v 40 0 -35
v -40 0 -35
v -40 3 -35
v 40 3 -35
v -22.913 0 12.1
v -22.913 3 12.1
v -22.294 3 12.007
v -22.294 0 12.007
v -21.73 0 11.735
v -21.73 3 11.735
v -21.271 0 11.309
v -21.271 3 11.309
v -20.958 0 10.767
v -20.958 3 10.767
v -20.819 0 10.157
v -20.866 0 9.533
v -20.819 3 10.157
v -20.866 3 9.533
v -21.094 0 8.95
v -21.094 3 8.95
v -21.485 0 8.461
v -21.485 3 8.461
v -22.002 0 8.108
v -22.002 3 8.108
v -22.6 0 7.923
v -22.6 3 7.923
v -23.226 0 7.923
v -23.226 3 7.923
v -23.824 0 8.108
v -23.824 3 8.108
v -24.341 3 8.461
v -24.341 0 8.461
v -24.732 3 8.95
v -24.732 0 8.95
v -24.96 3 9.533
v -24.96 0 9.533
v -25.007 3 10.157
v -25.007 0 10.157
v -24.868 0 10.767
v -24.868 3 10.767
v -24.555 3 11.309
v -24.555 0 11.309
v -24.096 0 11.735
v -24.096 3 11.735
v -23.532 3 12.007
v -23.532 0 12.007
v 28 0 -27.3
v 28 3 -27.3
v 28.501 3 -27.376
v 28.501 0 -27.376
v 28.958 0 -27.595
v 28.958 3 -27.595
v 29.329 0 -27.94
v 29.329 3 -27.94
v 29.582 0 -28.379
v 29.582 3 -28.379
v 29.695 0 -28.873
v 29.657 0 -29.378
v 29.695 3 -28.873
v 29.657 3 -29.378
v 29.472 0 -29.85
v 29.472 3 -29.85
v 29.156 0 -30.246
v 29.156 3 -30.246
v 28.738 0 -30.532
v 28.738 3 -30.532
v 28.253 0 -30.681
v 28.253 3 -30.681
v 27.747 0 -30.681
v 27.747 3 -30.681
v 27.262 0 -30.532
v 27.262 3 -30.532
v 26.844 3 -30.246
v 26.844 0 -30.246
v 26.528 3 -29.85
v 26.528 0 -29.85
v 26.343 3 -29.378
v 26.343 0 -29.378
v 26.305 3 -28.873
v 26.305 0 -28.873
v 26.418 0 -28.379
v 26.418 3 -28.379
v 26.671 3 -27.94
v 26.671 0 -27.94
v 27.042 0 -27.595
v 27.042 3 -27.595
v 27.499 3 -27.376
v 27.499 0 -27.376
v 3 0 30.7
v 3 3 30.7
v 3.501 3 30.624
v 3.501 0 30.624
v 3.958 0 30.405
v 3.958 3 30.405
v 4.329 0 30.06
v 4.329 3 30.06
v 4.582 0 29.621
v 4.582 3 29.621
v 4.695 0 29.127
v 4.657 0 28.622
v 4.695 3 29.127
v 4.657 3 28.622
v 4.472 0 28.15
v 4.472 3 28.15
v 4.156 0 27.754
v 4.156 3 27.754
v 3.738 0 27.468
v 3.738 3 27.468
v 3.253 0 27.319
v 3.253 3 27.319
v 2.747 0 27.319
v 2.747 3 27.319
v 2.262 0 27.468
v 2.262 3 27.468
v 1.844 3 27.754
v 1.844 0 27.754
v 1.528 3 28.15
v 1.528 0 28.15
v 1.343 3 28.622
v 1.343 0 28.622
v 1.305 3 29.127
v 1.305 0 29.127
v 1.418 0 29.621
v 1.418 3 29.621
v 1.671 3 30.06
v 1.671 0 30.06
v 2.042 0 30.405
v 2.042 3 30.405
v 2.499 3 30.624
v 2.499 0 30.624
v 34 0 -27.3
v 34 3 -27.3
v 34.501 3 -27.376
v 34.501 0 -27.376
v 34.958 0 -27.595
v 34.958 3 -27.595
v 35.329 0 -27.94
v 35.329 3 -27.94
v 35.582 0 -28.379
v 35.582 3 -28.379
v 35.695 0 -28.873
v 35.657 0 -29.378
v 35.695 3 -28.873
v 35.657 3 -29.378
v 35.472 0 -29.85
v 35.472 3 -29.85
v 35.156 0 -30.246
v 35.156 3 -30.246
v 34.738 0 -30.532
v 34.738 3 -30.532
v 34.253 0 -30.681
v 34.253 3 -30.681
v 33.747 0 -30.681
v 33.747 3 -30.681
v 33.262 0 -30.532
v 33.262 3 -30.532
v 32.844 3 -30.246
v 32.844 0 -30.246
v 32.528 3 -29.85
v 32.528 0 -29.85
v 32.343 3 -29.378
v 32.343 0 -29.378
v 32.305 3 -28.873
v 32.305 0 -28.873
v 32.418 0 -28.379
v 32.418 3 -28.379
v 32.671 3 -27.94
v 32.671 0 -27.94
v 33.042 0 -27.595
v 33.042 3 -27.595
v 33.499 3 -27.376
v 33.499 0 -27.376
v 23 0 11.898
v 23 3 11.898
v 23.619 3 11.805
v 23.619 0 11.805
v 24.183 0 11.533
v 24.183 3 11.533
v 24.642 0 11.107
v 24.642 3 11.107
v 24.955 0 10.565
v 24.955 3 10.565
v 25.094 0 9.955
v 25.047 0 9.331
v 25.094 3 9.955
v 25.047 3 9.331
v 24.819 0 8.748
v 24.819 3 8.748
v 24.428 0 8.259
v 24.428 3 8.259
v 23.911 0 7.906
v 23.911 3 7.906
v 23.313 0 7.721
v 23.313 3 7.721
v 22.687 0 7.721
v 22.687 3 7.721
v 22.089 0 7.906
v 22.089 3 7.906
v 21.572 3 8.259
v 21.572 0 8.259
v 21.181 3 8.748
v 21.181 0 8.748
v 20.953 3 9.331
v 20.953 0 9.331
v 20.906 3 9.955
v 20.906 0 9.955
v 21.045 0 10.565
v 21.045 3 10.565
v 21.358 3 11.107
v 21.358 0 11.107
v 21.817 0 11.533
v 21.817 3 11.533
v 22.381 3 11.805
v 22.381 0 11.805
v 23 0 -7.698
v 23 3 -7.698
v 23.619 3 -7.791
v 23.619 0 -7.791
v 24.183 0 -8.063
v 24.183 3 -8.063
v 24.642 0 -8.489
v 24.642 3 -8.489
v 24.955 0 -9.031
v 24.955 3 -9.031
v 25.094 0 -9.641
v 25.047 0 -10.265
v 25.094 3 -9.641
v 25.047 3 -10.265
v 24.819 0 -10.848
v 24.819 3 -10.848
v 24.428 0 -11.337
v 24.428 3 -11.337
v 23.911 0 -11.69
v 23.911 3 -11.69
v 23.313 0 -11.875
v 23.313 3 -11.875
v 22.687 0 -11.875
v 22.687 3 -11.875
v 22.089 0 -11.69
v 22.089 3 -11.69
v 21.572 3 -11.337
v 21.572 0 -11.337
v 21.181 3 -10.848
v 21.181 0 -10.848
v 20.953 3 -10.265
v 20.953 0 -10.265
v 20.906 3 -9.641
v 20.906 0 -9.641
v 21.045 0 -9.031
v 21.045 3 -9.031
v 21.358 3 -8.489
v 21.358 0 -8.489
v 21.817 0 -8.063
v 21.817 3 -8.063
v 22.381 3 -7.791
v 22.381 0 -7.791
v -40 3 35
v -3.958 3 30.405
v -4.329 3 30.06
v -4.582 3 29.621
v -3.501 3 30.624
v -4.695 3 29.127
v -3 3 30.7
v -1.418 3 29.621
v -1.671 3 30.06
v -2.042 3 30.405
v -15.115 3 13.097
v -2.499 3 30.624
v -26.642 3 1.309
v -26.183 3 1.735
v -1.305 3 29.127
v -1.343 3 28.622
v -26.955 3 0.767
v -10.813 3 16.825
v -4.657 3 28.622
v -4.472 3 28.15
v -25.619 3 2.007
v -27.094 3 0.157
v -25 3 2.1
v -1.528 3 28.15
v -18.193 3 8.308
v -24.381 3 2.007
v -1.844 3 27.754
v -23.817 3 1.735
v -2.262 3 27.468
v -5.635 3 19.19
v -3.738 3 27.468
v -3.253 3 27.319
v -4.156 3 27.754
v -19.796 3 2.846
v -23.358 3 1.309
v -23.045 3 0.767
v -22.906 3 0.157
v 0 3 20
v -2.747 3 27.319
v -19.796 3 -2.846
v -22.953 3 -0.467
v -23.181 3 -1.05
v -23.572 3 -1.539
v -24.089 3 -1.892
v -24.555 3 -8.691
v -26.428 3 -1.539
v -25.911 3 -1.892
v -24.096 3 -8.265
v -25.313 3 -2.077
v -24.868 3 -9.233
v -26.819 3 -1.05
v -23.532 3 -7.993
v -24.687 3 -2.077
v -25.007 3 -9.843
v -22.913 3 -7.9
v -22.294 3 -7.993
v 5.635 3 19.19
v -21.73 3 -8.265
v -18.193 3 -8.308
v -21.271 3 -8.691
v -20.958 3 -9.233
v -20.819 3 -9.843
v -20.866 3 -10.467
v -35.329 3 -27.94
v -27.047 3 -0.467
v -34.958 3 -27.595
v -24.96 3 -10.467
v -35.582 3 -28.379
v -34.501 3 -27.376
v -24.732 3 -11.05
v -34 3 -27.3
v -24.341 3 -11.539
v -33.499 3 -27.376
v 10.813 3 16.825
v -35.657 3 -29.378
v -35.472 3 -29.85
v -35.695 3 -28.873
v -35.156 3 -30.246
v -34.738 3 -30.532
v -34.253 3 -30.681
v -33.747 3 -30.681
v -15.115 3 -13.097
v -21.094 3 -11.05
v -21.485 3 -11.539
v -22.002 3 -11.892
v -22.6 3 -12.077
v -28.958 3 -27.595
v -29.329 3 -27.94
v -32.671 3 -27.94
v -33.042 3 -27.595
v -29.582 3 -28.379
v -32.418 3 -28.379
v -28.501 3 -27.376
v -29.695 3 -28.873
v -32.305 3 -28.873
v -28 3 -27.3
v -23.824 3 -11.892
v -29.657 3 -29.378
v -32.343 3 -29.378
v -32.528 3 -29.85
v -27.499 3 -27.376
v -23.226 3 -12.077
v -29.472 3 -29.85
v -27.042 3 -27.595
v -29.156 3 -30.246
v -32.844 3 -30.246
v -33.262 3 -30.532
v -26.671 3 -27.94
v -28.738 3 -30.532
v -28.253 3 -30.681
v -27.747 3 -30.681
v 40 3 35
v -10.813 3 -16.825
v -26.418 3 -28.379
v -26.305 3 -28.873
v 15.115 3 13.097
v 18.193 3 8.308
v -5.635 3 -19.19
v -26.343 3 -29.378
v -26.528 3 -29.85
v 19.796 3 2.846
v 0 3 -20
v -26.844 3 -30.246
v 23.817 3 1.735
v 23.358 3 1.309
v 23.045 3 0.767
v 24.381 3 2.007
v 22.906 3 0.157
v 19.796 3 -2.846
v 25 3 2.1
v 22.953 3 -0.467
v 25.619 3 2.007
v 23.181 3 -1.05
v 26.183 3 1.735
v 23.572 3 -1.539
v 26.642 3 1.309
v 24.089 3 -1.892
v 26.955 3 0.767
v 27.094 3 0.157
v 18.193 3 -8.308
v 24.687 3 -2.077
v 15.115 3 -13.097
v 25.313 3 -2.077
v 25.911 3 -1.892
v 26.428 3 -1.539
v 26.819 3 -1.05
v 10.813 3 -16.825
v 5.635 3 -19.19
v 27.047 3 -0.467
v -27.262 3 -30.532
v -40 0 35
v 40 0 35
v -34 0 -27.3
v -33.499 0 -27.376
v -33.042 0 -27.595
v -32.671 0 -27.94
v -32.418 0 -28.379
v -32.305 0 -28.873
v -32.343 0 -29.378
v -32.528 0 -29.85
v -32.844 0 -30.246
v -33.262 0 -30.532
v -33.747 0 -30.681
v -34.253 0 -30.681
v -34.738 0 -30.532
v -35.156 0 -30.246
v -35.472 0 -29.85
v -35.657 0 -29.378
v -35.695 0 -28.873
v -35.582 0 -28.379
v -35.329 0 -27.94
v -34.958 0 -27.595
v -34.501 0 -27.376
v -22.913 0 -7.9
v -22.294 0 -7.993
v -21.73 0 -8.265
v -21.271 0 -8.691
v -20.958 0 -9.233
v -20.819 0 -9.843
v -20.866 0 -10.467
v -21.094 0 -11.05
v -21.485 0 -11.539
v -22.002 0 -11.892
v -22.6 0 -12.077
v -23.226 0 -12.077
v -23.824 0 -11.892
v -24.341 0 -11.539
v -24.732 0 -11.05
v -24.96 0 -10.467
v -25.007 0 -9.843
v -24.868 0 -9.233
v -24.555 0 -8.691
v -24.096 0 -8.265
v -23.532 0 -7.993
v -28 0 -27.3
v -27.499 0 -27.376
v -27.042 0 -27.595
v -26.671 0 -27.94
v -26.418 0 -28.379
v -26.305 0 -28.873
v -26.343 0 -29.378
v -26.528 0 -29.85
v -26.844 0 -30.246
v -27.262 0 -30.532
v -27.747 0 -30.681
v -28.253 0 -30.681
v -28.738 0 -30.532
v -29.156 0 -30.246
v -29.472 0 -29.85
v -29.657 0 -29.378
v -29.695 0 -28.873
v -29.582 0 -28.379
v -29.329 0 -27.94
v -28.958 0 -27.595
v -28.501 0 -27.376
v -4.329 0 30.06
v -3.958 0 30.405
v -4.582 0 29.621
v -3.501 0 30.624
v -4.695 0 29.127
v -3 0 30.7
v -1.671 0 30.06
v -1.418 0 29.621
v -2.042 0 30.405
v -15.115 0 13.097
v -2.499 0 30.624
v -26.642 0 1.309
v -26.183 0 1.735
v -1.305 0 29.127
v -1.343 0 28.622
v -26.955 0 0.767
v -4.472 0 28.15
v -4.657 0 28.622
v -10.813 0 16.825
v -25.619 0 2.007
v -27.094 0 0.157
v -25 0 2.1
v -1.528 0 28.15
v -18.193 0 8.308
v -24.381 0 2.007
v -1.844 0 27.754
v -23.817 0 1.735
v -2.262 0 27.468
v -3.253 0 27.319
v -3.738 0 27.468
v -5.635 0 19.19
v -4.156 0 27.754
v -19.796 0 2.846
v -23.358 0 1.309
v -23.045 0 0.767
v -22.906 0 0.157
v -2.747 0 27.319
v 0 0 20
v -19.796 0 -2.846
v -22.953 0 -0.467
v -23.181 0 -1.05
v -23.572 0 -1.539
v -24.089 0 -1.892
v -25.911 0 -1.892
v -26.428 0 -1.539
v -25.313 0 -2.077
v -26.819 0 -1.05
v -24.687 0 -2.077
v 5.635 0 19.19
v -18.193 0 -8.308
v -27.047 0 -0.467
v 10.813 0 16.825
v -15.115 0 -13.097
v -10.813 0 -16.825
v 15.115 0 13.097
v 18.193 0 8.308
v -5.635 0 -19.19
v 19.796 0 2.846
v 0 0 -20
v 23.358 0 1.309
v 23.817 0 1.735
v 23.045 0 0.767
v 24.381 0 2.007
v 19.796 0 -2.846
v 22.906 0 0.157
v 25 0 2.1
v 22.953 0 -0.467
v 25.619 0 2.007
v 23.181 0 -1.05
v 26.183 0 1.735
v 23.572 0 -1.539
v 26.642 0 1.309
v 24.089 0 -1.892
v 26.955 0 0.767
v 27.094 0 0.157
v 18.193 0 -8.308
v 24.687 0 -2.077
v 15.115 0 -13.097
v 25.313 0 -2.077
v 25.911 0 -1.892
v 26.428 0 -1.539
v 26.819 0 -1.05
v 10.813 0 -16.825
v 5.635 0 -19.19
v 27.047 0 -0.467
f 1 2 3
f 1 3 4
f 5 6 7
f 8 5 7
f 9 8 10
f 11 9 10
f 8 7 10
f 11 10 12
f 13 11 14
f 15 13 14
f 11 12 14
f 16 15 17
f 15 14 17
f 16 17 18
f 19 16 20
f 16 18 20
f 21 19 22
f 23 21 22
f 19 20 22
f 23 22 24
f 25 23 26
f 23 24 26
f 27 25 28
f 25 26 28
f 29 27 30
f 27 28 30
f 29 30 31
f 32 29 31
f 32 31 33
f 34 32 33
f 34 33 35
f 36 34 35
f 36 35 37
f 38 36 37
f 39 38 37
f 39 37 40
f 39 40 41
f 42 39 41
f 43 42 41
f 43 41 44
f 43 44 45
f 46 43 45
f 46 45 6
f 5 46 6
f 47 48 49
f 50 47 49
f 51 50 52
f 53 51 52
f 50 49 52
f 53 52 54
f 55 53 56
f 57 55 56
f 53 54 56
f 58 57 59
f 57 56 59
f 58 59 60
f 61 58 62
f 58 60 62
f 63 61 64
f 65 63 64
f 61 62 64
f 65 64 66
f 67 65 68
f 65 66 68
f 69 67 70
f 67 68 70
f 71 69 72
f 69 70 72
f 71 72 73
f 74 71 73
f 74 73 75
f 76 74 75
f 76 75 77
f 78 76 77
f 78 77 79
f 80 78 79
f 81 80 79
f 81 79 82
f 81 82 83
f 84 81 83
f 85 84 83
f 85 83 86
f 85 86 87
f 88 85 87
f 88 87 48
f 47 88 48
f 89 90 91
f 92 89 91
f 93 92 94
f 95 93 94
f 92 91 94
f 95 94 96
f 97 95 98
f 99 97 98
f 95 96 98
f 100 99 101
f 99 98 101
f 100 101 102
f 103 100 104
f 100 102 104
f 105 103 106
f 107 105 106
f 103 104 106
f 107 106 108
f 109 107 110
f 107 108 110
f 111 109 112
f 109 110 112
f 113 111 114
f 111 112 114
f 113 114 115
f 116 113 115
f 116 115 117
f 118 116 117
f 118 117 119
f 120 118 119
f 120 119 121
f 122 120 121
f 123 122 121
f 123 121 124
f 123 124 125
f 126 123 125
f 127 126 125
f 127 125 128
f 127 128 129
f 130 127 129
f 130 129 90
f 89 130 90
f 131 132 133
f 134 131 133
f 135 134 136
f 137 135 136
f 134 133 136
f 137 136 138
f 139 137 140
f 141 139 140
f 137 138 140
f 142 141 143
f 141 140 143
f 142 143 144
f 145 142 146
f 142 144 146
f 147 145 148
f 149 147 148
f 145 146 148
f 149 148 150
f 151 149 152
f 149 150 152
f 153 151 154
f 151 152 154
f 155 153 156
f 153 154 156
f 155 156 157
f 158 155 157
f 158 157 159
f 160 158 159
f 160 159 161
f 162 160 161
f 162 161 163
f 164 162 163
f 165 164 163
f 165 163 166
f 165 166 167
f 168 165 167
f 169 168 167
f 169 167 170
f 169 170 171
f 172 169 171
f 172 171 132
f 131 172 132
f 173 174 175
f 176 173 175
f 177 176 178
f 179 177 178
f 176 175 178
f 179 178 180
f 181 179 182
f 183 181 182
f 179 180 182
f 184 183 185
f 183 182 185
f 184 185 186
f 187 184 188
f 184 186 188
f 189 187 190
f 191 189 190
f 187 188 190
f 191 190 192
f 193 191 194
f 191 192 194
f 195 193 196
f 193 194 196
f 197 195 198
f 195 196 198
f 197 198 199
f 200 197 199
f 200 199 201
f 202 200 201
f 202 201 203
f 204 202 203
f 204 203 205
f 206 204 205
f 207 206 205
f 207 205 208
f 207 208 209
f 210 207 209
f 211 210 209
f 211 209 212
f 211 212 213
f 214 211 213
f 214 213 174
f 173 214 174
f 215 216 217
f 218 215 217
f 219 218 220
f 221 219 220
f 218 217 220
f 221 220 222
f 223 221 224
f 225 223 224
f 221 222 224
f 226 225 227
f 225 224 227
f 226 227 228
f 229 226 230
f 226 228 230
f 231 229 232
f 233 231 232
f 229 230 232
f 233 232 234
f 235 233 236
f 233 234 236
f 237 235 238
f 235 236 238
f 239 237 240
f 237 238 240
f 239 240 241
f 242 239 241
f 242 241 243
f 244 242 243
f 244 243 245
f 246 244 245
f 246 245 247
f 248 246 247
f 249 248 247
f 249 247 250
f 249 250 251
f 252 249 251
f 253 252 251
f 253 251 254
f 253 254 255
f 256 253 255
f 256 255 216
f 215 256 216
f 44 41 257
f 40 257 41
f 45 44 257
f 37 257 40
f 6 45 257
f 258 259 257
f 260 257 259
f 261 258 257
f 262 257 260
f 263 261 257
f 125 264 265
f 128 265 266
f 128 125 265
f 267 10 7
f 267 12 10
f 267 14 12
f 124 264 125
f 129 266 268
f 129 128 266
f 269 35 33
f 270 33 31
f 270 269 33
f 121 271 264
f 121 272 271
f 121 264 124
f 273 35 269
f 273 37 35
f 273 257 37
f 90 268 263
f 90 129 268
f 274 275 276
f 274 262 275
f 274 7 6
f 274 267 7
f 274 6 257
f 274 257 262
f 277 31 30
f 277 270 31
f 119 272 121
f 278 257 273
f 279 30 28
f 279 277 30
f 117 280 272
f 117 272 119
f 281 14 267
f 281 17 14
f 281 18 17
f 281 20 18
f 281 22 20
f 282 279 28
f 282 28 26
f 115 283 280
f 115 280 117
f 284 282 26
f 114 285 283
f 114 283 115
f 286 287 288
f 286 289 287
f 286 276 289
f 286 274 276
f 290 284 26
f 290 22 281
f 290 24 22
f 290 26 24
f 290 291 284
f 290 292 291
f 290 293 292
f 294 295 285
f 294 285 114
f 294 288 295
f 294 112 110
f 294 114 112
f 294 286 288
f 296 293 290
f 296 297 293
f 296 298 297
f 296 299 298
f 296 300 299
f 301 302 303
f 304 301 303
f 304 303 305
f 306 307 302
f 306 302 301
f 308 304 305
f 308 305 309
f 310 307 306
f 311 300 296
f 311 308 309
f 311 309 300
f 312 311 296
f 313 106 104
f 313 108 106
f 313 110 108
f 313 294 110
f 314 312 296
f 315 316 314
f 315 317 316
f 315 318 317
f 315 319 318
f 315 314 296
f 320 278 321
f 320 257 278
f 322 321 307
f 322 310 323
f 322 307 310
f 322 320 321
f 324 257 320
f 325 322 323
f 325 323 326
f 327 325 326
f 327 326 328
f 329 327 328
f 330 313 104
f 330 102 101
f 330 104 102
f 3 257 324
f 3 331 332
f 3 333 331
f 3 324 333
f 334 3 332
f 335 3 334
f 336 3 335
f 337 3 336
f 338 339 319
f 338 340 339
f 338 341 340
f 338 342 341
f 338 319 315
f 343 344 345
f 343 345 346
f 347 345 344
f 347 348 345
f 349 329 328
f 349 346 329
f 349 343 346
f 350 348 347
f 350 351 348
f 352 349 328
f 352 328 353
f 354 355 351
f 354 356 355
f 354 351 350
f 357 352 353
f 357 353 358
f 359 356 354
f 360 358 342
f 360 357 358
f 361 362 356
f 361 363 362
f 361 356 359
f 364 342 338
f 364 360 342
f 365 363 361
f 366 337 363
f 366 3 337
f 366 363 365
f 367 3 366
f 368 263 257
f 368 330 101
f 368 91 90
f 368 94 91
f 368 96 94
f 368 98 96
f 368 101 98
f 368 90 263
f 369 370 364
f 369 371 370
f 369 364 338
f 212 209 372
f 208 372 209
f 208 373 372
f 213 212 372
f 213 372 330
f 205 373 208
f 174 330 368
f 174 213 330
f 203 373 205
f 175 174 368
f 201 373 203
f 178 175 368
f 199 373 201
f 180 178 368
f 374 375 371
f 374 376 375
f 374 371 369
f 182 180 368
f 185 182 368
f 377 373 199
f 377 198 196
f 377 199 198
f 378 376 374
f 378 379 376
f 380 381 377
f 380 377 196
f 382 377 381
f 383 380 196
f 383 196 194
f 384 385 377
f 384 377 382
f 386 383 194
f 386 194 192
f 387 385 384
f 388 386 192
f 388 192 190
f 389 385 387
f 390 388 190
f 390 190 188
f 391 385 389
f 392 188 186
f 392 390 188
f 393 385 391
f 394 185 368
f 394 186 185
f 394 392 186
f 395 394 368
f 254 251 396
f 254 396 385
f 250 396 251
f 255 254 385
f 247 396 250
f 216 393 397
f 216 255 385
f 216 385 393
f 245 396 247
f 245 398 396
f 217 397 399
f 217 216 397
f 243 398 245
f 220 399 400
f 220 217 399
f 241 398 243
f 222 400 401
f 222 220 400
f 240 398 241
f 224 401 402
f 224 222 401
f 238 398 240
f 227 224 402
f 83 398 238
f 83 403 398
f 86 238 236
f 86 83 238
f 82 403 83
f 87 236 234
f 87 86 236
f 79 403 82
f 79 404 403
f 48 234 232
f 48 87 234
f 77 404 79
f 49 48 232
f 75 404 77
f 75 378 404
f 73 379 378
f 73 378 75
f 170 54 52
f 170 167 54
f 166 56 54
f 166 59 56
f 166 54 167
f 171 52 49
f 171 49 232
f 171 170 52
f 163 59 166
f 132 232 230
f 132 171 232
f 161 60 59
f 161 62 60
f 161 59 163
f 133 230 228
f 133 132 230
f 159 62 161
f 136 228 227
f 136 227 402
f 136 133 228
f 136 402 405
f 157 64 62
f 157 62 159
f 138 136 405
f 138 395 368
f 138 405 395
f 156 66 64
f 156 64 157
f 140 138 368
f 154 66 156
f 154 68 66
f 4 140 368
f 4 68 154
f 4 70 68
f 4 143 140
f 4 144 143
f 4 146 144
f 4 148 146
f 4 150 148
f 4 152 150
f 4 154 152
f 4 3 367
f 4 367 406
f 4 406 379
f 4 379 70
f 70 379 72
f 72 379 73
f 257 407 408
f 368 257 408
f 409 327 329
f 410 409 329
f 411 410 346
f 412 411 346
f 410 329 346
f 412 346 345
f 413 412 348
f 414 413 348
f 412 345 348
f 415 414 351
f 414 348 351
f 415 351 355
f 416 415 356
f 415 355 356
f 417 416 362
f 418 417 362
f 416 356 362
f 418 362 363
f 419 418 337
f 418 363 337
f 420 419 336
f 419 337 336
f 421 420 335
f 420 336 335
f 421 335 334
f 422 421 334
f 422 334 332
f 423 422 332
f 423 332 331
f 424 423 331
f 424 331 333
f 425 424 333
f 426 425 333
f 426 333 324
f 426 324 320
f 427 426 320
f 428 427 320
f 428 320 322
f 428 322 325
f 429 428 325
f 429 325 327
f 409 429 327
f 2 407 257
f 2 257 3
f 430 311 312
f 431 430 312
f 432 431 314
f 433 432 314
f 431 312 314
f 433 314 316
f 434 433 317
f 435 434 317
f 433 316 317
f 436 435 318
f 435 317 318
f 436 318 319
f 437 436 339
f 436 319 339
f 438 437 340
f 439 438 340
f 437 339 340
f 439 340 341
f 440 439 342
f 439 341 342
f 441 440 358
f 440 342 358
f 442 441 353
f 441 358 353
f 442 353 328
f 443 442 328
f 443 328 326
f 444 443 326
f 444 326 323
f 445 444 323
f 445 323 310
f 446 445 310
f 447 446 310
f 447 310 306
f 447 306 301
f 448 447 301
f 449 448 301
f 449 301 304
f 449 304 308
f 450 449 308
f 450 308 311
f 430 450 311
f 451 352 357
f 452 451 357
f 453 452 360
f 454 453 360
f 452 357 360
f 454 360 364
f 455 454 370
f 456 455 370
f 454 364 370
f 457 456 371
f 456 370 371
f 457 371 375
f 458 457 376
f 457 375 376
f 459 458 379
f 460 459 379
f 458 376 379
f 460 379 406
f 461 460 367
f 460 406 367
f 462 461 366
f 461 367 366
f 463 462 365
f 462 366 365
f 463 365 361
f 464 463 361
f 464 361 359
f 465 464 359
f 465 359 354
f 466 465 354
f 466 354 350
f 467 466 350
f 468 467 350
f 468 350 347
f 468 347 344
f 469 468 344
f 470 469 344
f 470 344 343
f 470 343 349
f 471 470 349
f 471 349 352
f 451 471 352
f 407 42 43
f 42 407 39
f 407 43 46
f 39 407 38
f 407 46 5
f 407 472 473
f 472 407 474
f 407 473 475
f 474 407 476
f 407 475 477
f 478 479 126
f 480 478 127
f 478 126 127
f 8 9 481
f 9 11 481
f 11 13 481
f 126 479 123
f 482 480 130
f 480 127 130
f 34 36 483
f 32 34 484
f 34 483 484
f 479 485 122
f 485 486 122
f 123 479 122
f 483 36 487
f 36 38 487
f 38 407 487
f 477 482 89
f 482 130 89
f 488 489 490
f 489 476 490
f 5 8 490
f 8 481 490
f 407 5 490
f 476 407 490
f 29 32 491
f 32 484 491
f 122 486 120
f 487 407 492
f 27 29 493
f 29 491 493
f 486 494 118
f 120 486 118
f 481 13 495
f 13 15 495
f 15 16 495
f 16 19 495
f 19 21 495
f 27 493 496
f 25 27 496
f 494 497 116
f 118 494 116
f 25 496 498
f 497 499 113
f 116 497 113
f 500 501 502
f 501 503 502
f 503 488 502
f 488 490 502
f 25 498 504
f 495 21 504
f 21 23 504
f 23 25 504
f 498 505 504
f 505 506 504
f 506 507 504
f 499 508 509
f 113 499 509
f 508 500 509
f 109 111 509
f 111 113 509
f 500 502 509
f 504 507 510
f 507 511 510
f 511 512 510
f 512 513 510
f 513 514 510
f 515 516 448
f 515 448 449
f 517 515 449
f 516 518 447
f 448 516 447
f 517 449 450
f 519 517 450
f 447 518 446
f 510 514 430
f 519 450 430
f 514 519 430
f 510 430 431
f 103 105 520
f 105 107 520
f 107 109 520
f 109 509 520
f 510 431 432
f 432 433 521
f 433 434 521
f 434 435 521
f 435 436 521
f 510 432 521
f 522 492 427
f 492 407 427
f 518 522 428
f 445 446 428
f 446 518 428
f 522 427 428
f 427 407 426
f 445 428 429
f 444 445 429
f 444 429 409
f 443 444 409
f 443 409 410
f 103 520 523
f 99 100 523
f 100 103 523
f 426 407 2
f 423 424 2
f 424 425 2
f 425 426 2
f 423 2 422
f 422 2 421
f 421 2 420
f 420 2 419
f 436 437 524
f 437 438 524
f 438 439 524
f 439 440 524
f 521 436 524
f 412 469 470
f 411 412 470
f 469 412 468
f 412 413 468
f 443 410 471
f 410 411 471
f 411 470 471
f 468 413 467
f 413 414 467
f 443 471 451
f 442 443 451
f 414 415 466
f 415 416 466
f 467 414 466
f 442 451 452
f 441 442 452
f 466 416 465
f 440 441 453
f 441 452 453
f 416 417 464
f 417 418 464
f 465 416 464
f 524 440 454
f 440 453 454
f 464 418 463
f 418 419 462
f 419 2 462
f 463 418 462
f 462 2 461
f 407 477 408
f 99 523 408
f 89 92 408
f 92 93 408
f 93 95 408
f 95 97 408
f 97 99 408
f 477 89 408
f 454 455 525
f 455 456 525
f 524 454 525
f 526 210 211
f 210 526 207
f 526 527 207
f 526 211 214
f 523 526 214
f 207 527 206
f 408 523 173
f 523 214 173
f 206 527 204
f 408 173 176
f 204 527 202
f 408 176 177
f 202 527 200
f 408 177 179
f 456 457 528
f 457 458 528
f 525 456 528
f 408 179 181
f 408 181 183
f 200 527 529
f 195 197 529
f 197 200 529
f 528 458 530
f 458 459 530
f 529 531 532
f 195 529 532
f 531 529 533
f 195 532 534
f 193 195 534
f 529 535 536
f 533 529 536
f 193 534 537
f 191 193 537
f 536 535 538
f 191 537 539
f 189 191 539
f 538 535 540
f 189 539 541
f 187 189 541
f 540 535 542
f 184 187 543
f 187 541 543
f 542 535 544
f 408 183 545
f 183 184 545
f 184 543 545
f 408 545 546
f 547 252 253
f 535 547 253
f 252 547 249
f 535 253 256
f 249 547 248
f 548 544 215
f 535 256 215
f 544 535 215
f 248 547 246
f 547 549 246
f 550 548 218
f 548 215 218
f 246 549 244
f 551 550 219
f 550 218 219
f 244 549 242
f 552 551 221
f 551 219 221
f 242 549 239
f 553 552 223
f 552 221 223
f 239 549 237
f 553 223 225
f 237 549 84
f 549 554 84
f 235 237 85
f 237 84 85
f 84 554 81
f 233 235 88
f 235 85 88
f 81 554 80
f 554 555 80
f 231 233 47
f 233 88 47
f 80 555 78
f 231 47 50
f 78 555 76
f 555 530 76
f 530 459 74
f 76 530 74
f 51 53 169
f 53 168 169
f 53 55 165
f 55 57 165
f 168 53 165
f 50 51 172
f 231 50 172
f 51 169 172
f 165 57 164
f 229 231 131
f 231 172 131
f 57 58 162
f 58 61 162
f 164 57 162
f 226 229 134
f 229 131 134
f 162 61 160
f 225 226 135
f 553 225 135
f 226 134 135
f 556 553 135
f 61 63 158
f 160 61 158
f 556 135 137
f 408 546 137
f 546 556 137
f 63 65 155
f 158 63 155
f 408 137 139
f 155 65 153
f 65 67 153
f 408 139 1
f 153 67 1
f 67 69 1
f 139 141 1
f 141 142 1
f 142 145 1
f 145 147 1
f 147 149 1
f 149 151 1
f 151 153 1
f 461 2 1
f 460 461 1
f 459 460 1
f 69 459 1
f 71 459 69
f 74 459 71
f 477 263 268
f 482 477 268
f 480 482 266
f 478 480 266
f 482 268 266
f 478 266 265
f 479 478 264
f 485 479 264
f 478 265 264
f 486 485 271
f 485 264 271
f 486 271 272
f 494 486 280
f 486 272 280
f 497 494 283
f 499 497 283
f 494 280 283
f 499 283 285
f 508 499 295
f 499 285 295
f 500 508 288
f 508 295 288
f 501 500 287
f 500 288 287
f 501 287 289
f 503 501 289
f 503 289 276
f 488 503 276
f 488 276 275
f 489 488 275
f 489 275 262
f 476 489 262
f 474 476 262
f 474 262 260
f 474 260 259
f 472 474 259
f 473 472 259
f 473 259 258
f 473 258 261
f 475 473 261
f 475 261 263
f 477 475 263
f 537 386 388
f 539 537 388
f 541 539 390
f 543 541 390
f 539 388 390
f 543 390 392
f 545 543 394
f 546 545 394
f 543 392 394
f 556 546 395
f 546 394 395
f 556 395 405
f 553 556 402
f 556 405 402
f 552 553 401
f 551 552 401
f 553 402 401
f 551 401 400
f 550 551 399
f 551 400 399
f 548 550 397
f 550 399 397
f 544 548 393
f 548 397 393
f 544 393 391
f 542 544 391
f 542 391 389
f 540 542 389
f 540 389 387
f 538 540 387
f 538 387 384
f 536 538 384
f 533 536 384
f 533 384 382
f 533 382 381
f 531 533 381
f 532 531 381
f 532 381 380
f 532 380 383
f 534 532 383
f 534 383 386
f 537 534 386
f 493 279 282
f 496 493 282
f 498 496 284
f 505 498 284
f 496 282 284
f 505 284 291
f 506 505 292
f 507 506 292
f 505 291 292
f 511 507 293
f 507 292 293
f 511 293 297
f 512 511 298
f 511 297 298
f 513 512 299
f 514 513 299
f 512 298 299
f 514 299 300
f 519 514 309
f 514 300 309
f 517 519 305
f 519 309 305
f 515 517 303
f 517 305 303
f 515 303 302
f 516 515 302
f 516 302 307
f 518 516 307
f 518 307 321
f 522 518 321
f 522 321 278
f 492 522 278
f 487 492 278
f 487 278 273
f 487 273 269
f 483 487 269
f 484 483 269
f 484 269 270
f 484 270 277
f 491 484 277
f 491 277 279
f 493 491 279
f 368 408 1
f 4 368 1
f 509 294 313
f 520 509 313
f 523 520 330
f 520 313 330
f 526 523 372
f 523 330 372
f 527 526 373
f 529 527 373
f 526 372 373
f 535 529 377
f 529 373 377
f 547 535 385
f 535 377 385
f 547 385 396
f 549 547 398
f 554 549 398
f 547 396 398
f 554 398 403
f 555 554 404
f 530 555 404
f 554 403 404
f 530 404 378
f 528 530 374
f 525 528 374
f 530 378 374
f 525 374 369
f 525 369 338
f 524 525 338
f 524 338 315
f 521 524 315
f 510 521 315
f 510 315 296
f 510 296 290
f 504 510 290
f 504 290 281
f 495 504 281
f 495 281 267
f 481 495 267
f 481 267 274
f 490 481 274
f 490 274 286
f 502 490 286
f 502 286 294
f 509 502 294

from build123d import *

# Parameters (mm, degrees)
BASE_W                        = 80
BASE_H                        = 70
BASE_PLATE_DEPTH              = 3
EXTRUDER_HOLE_CUT_REACH       = 55.235
EXTRUDER_HOLE_R               = 20
EXTRUDER_SREW_HOLES_CUT_REACH = 55.235
EXTRUDER_MOUNT_HOLES_R        = 2.1
LM8_TWO_REACH                 = 55.235
LM8UU_HOLES_R                 = 1.7
LM8_CENTER_REACH              = 55.235
LM8UU_CENTER_R                = 1.7


with BuildPart() as part:
    # Base → Base Plate (new body)
    with BuildSketch(Plane(origin=(0, 0, 0), x_dir=(1, 0, 0), z_dir=(0, 1, 0))):
        Rectangle(BASE_W, BASE_H)
    extrude(amount=BASE_PLATE_DEPTH)

    # Extruder hole → Extruder Hole Cut (cut, up to next)
    with BuildSketch(Plane(origin=(0, 3, 0), x_dir=(1, 0, 0), z_dir=(0, 1, 0)), mode=Mode.PRIVATE) as extruder_hole_cut_sk1:
        with Locations(Location((0, 0, 0), (0, 0, 270))):
            Circle(EXTRUDER_HOLE_R)
    extruder_hole_cut_tool1 = extrude(extruder_hole_cut_sk1.sketch, amount=-EXTRUDER_HOLE_CUT_REACH, mode=Mode.PRIVATE) & part.part
    add(extruder_hole_cut_tool1.solids().sort_by_distance((0, 3, 0))[0], mode=Mode.SUBTRACT)

    # Extruder Mount Holes → Extruder Srew Holes Cut (cut, up to next)
    with BuildSketch(Plane(origin=(0, 3, 0), x_dir=(1, 0, 0), z_dir=(0, 1, 0)), mode=Mode.PRIVATE) as extruder_srew_holes_cut_sk1:
        with Locations(Location((-25, 0, 0), (0, 0, 270))):
            Circle(EXTRUDER_MOUNT_HOLES_R)
    extruder_srew_holes_cut_tool1 = extrude(extruder_srew_holes_cut_sk1.sketch, amount=-EXTRUDER_SREW_HOLES_CUT_REACH, mode=Mode.PRIVATE) & part.part
    # Extruder Mount Holes → Extruder Srew Holes Cut (cut, up to next)
    with BuildSketch(Plane(origin=(0, 3, 0), x_dir=(1, 0, 0), z_dir=(0, 1, 0)), mode=Mode.PRIVATE) as extruder_srew_holes_cut_sk2:
        with Locations(Location((-22.912878475, 10, 0), (0, 0, 270))):
            Circle(EXTRUDER_MOUNT_HOLES_R)
    extruder_srew_holes_cut_tool2 = extrude(extruder_srew_holes_cut_sk2.sketch, amount=-EXTRUDER_SREW_HOLES_CUT_REACH, mode=Mode.PRIVATE) & part.part
    # Extruder Mount Holes → Extruder Srew Holes Cut (cut, up to next)
    with BuildSketch(Plane(origin=(0, 3, 0), x_dir=(1, 0, 0), z_dir=(0, 1, 0)), mode=Mode.PRIVATE) as extruder_srew_holes_cut_sk3:
        with Locations(Location((-22.912878475, -10, 0), (0, 0, 270))):
            Circle(EXTRUDER_MOUNT_HOLES_R)
    extruder_srew_holes_cut_tool3 = extrude(extruder_srew_holes_cut_sk3.sketch, amount=-EXTRUDER_SREW_HOLES_CUT_REACH, mode=Mode.PRIVATE) & part.part
    # Extruder Mount Holes → Extruder Srew Holes Cut (cut, up to next)
    with BuildSketch(Plane(origin=(0, 3, 0), x_dir=(1, 0, 0), z_dir=(0, 1, 0)), mode=Mode.PRIVATE) as extruder_srew_holes_cut_sk4:
        with Locations(Location((25, 0, 0), (0, 0, 270))):
            Circle(EXTRUDER_MOUNT_HOLES_R)
    extruder_srew_holes_cut_tool4 = extrude(extruder_srew_holes_cut_sk4.sketch, amount=-EXTRUDER_SREW_HOLES_CUT_REACH, mode=Mode.PRIVATE) & part.part
    # Extruder Mount Holes → Extruder Srew Holes Cut (cut, up to next)
    with BuildSketch(Plane(origin=(0, 3, 0), x_dir=(1, 0, 0), z_dir=(0, 1, 0)), mode=Mode.PRIVATE) as extruder_srew_holes_cut_sk5:
        with Locations(Location((23, 9.797958971, 0), (0, 0, 270))):
            Circle(EXTRUDER_MOUNT_HOLES_R)
    extruder_srew_holes_cut_tool5 = extrude(extruder_srew_holes_cut_sk5.sketch, amount=-EXTRUDER_SREW_HOLES_CUT_REACH, mode=Mode.PRIVATE) & part.part
    # Extruder Mount Holes → Extruder Srew Holes Cut (cut, up to next)
    with BuildSketch(Plane(origin=(0, 3, 0), x_dir=(1, 0, 0), z_dir=(0, 1, 0)), mode=Mode.PRIVATE) as extruder_srew_holes_cut_sk6:
        with Locations(Location((23, -9.797958971, 0), (0, 0, 270))):
            Circle(EXTRUDER_MOUNT_HOLES_R)
    extruder_srew_holes_cut_tool6 = extrude(extruder_srew_holes_cut_sk6.sketch, amount=-EXTRUDER_SREW_HOLES_CUT_REACH, mode=Mode.PRIVATE) & part.part
    add(extruder_srew_holes_cut_tool1.solids().sort_by_distance((-25, 3, 0))[0], mode=Mode.SUBTRACT)
    add(extruder_srew_holes_cut_tool2.solids().sort_by_distance((-22.912878, 3, -10))[0], mode=Mode.SUBTRACT)
    add(extruder_srew_holes_cut_tool3.solids().sort_by_distance((-22.912878, 3, 10))[0], mode=Mode.SUBTRACT)
    add(extruder_srew_holes_cut_tool4.solids().sort_by_distance((25, 3, 0))[0], mode=Mode.SUBTRACT)
    add(extruder_srew_holes_cut_tool5.solids().sort_by_distance((23, 3, -9.797959))[0], mode=Mode.SUBTRACT)
    add(extruder_srew_holes_cut_tool6.solids().sort_by_distance((23, 3, 9.797959))[0], mode=Mode.SUBTRACT)

    # LM8uu Holes → LM8 Two (cut, up to next)
    with BuildSketch(Plane(origin=(0, 3, 0), x_dir=(1, 0, 0), z_dir=(0, 1, 0)), mode=Mode.PRIVATE) as lm8_two_sk1:
        with Locations(Location((-34, 29, 0), (0, 0, 270))):
            Circle(LM8UU_HOLES_R)
    lm8_two_tool1 = extrude(lm8_two_sk1.sketch, amount=-LM8_TWO_REACH, mode=Mode.PRIVATE) & part.part
    # LM8uu Holes → LM8 Two (cut, up to next)
    with BuildSketch(Plane(origin=(0, 3, 0), x_dir=(1, 0, 0), z_dir=(0, 1, 0)), mode=Mode.PRIVATE) as lm8_two_sk2:
        with Locations(Location((-28, 29, 0), (0, 0, 270))):
            Circle(LM8UU_HOLES_R)
    lm8_two_tool2 = extrude(lm8_two_sk2.sketch, amount=-LM8_TWO_REACH, mode=Mode.PRIVATE) & part.part
    # LM8uu Holes → LM8 Two (cut, up to next)
    with BuildSketch(Plane(origin=(0, 3, 0), x_dir=(1, 0, 0), z_dir=(0, 1, 0)), mode=Mode.PRIVATE) as lm8_two_sk3:
        with Locations(Location((28, 29, 0), (0, 0, 270))):
            Circle(LM8UU_HOLES_R)
    lm8_two_tool3 = extrude(lm8_two_sk3.sketch, amount=-LM8_TWO_REACH, mode=Mode.PRIVATE) & part.part
    # LM8uu Holes → LM8 Two (cut, up to next)
    with BuildSketch(Plane(origin=(0, 3, 0), x_dir=(1, 0, 0), z_dir=(0, 1, 0)), mode=Mode.PRIVATE) as lm8_two_sk4:
        with Locations(Location((34, 29, 0), (0, 0, 270))):
            Circle(LM8UU_HOLES_R)
    lm8_two_tool4 = extrude(lm8_two_sk4.sketch, amount=-LM8_TWO_REACH, mode=Mode.PRIVATE) & part.part
    add(lm8_two_tool1.solids().sort_by_distance((-34, 3, -29))[0], mode=Mode.SUBTRACT)
    add(lm8_two_tool2.solids().sort_by_distance((-28, 3, -29))[0], mode=Mode.SUBTRACT)
    add(lm8_two_tool3.solids().sort_by_distance((28, 3, -29))[0], mode=Mode.SUBTRACT)
    add(lm8_two_tool4.solids().sort_by_distance((34, 3, -29))[0], mode=Mode.SUBTRACT)

    # LM8uu Center → LM8 Center (cut, up to next)
    with BuildSketch(Plane(origin=(0, 3, 0), x_dir=(1, 0, 0), z_dir=(0, 1, 0)), mode=Mode.PRIVATE) as lm8_center_sk1:
        with Locations(Location((-3, -29, 0), (0, 0, 270))):
            Circle(LM8UU_CENTER_R)
    lm8_center_tool1 = extrude(lm8_center_sk1.sketch, amount=-LM8_CENTER_REACH, mode=Mode.PRIVATE) & part.part
    # LM8uu Center → LM8 Center (cut, up to next)
    with BuildSketch(Plane(origin=(0, 3, 0), x_dir=(1, 0, 0), z_dir=(0, 1, 0)), mode=Mode.PRIVATE) as lm8_center_sk2:
        with Locations(Location((3, -29, 0), (0, 0, 270))):
            Circle(LM8UU_CENTER_R)
    lm8_center_tool2 = extrude(lm8_center_sk2.sketch, amount=-LM8_CENTER_REACH, mode=Mode.PRIVATE) & part.part
    add(lm8_center_tool1.solids().sort_by_distance((-3, 3, 29))[0], mode=Mode.SUBTRACT)
    add(lm8_center_tool2.solids().sort_by_distance((3, 3, 29))[0], mode=Mode.SUBTRACT)


solid = part.part
